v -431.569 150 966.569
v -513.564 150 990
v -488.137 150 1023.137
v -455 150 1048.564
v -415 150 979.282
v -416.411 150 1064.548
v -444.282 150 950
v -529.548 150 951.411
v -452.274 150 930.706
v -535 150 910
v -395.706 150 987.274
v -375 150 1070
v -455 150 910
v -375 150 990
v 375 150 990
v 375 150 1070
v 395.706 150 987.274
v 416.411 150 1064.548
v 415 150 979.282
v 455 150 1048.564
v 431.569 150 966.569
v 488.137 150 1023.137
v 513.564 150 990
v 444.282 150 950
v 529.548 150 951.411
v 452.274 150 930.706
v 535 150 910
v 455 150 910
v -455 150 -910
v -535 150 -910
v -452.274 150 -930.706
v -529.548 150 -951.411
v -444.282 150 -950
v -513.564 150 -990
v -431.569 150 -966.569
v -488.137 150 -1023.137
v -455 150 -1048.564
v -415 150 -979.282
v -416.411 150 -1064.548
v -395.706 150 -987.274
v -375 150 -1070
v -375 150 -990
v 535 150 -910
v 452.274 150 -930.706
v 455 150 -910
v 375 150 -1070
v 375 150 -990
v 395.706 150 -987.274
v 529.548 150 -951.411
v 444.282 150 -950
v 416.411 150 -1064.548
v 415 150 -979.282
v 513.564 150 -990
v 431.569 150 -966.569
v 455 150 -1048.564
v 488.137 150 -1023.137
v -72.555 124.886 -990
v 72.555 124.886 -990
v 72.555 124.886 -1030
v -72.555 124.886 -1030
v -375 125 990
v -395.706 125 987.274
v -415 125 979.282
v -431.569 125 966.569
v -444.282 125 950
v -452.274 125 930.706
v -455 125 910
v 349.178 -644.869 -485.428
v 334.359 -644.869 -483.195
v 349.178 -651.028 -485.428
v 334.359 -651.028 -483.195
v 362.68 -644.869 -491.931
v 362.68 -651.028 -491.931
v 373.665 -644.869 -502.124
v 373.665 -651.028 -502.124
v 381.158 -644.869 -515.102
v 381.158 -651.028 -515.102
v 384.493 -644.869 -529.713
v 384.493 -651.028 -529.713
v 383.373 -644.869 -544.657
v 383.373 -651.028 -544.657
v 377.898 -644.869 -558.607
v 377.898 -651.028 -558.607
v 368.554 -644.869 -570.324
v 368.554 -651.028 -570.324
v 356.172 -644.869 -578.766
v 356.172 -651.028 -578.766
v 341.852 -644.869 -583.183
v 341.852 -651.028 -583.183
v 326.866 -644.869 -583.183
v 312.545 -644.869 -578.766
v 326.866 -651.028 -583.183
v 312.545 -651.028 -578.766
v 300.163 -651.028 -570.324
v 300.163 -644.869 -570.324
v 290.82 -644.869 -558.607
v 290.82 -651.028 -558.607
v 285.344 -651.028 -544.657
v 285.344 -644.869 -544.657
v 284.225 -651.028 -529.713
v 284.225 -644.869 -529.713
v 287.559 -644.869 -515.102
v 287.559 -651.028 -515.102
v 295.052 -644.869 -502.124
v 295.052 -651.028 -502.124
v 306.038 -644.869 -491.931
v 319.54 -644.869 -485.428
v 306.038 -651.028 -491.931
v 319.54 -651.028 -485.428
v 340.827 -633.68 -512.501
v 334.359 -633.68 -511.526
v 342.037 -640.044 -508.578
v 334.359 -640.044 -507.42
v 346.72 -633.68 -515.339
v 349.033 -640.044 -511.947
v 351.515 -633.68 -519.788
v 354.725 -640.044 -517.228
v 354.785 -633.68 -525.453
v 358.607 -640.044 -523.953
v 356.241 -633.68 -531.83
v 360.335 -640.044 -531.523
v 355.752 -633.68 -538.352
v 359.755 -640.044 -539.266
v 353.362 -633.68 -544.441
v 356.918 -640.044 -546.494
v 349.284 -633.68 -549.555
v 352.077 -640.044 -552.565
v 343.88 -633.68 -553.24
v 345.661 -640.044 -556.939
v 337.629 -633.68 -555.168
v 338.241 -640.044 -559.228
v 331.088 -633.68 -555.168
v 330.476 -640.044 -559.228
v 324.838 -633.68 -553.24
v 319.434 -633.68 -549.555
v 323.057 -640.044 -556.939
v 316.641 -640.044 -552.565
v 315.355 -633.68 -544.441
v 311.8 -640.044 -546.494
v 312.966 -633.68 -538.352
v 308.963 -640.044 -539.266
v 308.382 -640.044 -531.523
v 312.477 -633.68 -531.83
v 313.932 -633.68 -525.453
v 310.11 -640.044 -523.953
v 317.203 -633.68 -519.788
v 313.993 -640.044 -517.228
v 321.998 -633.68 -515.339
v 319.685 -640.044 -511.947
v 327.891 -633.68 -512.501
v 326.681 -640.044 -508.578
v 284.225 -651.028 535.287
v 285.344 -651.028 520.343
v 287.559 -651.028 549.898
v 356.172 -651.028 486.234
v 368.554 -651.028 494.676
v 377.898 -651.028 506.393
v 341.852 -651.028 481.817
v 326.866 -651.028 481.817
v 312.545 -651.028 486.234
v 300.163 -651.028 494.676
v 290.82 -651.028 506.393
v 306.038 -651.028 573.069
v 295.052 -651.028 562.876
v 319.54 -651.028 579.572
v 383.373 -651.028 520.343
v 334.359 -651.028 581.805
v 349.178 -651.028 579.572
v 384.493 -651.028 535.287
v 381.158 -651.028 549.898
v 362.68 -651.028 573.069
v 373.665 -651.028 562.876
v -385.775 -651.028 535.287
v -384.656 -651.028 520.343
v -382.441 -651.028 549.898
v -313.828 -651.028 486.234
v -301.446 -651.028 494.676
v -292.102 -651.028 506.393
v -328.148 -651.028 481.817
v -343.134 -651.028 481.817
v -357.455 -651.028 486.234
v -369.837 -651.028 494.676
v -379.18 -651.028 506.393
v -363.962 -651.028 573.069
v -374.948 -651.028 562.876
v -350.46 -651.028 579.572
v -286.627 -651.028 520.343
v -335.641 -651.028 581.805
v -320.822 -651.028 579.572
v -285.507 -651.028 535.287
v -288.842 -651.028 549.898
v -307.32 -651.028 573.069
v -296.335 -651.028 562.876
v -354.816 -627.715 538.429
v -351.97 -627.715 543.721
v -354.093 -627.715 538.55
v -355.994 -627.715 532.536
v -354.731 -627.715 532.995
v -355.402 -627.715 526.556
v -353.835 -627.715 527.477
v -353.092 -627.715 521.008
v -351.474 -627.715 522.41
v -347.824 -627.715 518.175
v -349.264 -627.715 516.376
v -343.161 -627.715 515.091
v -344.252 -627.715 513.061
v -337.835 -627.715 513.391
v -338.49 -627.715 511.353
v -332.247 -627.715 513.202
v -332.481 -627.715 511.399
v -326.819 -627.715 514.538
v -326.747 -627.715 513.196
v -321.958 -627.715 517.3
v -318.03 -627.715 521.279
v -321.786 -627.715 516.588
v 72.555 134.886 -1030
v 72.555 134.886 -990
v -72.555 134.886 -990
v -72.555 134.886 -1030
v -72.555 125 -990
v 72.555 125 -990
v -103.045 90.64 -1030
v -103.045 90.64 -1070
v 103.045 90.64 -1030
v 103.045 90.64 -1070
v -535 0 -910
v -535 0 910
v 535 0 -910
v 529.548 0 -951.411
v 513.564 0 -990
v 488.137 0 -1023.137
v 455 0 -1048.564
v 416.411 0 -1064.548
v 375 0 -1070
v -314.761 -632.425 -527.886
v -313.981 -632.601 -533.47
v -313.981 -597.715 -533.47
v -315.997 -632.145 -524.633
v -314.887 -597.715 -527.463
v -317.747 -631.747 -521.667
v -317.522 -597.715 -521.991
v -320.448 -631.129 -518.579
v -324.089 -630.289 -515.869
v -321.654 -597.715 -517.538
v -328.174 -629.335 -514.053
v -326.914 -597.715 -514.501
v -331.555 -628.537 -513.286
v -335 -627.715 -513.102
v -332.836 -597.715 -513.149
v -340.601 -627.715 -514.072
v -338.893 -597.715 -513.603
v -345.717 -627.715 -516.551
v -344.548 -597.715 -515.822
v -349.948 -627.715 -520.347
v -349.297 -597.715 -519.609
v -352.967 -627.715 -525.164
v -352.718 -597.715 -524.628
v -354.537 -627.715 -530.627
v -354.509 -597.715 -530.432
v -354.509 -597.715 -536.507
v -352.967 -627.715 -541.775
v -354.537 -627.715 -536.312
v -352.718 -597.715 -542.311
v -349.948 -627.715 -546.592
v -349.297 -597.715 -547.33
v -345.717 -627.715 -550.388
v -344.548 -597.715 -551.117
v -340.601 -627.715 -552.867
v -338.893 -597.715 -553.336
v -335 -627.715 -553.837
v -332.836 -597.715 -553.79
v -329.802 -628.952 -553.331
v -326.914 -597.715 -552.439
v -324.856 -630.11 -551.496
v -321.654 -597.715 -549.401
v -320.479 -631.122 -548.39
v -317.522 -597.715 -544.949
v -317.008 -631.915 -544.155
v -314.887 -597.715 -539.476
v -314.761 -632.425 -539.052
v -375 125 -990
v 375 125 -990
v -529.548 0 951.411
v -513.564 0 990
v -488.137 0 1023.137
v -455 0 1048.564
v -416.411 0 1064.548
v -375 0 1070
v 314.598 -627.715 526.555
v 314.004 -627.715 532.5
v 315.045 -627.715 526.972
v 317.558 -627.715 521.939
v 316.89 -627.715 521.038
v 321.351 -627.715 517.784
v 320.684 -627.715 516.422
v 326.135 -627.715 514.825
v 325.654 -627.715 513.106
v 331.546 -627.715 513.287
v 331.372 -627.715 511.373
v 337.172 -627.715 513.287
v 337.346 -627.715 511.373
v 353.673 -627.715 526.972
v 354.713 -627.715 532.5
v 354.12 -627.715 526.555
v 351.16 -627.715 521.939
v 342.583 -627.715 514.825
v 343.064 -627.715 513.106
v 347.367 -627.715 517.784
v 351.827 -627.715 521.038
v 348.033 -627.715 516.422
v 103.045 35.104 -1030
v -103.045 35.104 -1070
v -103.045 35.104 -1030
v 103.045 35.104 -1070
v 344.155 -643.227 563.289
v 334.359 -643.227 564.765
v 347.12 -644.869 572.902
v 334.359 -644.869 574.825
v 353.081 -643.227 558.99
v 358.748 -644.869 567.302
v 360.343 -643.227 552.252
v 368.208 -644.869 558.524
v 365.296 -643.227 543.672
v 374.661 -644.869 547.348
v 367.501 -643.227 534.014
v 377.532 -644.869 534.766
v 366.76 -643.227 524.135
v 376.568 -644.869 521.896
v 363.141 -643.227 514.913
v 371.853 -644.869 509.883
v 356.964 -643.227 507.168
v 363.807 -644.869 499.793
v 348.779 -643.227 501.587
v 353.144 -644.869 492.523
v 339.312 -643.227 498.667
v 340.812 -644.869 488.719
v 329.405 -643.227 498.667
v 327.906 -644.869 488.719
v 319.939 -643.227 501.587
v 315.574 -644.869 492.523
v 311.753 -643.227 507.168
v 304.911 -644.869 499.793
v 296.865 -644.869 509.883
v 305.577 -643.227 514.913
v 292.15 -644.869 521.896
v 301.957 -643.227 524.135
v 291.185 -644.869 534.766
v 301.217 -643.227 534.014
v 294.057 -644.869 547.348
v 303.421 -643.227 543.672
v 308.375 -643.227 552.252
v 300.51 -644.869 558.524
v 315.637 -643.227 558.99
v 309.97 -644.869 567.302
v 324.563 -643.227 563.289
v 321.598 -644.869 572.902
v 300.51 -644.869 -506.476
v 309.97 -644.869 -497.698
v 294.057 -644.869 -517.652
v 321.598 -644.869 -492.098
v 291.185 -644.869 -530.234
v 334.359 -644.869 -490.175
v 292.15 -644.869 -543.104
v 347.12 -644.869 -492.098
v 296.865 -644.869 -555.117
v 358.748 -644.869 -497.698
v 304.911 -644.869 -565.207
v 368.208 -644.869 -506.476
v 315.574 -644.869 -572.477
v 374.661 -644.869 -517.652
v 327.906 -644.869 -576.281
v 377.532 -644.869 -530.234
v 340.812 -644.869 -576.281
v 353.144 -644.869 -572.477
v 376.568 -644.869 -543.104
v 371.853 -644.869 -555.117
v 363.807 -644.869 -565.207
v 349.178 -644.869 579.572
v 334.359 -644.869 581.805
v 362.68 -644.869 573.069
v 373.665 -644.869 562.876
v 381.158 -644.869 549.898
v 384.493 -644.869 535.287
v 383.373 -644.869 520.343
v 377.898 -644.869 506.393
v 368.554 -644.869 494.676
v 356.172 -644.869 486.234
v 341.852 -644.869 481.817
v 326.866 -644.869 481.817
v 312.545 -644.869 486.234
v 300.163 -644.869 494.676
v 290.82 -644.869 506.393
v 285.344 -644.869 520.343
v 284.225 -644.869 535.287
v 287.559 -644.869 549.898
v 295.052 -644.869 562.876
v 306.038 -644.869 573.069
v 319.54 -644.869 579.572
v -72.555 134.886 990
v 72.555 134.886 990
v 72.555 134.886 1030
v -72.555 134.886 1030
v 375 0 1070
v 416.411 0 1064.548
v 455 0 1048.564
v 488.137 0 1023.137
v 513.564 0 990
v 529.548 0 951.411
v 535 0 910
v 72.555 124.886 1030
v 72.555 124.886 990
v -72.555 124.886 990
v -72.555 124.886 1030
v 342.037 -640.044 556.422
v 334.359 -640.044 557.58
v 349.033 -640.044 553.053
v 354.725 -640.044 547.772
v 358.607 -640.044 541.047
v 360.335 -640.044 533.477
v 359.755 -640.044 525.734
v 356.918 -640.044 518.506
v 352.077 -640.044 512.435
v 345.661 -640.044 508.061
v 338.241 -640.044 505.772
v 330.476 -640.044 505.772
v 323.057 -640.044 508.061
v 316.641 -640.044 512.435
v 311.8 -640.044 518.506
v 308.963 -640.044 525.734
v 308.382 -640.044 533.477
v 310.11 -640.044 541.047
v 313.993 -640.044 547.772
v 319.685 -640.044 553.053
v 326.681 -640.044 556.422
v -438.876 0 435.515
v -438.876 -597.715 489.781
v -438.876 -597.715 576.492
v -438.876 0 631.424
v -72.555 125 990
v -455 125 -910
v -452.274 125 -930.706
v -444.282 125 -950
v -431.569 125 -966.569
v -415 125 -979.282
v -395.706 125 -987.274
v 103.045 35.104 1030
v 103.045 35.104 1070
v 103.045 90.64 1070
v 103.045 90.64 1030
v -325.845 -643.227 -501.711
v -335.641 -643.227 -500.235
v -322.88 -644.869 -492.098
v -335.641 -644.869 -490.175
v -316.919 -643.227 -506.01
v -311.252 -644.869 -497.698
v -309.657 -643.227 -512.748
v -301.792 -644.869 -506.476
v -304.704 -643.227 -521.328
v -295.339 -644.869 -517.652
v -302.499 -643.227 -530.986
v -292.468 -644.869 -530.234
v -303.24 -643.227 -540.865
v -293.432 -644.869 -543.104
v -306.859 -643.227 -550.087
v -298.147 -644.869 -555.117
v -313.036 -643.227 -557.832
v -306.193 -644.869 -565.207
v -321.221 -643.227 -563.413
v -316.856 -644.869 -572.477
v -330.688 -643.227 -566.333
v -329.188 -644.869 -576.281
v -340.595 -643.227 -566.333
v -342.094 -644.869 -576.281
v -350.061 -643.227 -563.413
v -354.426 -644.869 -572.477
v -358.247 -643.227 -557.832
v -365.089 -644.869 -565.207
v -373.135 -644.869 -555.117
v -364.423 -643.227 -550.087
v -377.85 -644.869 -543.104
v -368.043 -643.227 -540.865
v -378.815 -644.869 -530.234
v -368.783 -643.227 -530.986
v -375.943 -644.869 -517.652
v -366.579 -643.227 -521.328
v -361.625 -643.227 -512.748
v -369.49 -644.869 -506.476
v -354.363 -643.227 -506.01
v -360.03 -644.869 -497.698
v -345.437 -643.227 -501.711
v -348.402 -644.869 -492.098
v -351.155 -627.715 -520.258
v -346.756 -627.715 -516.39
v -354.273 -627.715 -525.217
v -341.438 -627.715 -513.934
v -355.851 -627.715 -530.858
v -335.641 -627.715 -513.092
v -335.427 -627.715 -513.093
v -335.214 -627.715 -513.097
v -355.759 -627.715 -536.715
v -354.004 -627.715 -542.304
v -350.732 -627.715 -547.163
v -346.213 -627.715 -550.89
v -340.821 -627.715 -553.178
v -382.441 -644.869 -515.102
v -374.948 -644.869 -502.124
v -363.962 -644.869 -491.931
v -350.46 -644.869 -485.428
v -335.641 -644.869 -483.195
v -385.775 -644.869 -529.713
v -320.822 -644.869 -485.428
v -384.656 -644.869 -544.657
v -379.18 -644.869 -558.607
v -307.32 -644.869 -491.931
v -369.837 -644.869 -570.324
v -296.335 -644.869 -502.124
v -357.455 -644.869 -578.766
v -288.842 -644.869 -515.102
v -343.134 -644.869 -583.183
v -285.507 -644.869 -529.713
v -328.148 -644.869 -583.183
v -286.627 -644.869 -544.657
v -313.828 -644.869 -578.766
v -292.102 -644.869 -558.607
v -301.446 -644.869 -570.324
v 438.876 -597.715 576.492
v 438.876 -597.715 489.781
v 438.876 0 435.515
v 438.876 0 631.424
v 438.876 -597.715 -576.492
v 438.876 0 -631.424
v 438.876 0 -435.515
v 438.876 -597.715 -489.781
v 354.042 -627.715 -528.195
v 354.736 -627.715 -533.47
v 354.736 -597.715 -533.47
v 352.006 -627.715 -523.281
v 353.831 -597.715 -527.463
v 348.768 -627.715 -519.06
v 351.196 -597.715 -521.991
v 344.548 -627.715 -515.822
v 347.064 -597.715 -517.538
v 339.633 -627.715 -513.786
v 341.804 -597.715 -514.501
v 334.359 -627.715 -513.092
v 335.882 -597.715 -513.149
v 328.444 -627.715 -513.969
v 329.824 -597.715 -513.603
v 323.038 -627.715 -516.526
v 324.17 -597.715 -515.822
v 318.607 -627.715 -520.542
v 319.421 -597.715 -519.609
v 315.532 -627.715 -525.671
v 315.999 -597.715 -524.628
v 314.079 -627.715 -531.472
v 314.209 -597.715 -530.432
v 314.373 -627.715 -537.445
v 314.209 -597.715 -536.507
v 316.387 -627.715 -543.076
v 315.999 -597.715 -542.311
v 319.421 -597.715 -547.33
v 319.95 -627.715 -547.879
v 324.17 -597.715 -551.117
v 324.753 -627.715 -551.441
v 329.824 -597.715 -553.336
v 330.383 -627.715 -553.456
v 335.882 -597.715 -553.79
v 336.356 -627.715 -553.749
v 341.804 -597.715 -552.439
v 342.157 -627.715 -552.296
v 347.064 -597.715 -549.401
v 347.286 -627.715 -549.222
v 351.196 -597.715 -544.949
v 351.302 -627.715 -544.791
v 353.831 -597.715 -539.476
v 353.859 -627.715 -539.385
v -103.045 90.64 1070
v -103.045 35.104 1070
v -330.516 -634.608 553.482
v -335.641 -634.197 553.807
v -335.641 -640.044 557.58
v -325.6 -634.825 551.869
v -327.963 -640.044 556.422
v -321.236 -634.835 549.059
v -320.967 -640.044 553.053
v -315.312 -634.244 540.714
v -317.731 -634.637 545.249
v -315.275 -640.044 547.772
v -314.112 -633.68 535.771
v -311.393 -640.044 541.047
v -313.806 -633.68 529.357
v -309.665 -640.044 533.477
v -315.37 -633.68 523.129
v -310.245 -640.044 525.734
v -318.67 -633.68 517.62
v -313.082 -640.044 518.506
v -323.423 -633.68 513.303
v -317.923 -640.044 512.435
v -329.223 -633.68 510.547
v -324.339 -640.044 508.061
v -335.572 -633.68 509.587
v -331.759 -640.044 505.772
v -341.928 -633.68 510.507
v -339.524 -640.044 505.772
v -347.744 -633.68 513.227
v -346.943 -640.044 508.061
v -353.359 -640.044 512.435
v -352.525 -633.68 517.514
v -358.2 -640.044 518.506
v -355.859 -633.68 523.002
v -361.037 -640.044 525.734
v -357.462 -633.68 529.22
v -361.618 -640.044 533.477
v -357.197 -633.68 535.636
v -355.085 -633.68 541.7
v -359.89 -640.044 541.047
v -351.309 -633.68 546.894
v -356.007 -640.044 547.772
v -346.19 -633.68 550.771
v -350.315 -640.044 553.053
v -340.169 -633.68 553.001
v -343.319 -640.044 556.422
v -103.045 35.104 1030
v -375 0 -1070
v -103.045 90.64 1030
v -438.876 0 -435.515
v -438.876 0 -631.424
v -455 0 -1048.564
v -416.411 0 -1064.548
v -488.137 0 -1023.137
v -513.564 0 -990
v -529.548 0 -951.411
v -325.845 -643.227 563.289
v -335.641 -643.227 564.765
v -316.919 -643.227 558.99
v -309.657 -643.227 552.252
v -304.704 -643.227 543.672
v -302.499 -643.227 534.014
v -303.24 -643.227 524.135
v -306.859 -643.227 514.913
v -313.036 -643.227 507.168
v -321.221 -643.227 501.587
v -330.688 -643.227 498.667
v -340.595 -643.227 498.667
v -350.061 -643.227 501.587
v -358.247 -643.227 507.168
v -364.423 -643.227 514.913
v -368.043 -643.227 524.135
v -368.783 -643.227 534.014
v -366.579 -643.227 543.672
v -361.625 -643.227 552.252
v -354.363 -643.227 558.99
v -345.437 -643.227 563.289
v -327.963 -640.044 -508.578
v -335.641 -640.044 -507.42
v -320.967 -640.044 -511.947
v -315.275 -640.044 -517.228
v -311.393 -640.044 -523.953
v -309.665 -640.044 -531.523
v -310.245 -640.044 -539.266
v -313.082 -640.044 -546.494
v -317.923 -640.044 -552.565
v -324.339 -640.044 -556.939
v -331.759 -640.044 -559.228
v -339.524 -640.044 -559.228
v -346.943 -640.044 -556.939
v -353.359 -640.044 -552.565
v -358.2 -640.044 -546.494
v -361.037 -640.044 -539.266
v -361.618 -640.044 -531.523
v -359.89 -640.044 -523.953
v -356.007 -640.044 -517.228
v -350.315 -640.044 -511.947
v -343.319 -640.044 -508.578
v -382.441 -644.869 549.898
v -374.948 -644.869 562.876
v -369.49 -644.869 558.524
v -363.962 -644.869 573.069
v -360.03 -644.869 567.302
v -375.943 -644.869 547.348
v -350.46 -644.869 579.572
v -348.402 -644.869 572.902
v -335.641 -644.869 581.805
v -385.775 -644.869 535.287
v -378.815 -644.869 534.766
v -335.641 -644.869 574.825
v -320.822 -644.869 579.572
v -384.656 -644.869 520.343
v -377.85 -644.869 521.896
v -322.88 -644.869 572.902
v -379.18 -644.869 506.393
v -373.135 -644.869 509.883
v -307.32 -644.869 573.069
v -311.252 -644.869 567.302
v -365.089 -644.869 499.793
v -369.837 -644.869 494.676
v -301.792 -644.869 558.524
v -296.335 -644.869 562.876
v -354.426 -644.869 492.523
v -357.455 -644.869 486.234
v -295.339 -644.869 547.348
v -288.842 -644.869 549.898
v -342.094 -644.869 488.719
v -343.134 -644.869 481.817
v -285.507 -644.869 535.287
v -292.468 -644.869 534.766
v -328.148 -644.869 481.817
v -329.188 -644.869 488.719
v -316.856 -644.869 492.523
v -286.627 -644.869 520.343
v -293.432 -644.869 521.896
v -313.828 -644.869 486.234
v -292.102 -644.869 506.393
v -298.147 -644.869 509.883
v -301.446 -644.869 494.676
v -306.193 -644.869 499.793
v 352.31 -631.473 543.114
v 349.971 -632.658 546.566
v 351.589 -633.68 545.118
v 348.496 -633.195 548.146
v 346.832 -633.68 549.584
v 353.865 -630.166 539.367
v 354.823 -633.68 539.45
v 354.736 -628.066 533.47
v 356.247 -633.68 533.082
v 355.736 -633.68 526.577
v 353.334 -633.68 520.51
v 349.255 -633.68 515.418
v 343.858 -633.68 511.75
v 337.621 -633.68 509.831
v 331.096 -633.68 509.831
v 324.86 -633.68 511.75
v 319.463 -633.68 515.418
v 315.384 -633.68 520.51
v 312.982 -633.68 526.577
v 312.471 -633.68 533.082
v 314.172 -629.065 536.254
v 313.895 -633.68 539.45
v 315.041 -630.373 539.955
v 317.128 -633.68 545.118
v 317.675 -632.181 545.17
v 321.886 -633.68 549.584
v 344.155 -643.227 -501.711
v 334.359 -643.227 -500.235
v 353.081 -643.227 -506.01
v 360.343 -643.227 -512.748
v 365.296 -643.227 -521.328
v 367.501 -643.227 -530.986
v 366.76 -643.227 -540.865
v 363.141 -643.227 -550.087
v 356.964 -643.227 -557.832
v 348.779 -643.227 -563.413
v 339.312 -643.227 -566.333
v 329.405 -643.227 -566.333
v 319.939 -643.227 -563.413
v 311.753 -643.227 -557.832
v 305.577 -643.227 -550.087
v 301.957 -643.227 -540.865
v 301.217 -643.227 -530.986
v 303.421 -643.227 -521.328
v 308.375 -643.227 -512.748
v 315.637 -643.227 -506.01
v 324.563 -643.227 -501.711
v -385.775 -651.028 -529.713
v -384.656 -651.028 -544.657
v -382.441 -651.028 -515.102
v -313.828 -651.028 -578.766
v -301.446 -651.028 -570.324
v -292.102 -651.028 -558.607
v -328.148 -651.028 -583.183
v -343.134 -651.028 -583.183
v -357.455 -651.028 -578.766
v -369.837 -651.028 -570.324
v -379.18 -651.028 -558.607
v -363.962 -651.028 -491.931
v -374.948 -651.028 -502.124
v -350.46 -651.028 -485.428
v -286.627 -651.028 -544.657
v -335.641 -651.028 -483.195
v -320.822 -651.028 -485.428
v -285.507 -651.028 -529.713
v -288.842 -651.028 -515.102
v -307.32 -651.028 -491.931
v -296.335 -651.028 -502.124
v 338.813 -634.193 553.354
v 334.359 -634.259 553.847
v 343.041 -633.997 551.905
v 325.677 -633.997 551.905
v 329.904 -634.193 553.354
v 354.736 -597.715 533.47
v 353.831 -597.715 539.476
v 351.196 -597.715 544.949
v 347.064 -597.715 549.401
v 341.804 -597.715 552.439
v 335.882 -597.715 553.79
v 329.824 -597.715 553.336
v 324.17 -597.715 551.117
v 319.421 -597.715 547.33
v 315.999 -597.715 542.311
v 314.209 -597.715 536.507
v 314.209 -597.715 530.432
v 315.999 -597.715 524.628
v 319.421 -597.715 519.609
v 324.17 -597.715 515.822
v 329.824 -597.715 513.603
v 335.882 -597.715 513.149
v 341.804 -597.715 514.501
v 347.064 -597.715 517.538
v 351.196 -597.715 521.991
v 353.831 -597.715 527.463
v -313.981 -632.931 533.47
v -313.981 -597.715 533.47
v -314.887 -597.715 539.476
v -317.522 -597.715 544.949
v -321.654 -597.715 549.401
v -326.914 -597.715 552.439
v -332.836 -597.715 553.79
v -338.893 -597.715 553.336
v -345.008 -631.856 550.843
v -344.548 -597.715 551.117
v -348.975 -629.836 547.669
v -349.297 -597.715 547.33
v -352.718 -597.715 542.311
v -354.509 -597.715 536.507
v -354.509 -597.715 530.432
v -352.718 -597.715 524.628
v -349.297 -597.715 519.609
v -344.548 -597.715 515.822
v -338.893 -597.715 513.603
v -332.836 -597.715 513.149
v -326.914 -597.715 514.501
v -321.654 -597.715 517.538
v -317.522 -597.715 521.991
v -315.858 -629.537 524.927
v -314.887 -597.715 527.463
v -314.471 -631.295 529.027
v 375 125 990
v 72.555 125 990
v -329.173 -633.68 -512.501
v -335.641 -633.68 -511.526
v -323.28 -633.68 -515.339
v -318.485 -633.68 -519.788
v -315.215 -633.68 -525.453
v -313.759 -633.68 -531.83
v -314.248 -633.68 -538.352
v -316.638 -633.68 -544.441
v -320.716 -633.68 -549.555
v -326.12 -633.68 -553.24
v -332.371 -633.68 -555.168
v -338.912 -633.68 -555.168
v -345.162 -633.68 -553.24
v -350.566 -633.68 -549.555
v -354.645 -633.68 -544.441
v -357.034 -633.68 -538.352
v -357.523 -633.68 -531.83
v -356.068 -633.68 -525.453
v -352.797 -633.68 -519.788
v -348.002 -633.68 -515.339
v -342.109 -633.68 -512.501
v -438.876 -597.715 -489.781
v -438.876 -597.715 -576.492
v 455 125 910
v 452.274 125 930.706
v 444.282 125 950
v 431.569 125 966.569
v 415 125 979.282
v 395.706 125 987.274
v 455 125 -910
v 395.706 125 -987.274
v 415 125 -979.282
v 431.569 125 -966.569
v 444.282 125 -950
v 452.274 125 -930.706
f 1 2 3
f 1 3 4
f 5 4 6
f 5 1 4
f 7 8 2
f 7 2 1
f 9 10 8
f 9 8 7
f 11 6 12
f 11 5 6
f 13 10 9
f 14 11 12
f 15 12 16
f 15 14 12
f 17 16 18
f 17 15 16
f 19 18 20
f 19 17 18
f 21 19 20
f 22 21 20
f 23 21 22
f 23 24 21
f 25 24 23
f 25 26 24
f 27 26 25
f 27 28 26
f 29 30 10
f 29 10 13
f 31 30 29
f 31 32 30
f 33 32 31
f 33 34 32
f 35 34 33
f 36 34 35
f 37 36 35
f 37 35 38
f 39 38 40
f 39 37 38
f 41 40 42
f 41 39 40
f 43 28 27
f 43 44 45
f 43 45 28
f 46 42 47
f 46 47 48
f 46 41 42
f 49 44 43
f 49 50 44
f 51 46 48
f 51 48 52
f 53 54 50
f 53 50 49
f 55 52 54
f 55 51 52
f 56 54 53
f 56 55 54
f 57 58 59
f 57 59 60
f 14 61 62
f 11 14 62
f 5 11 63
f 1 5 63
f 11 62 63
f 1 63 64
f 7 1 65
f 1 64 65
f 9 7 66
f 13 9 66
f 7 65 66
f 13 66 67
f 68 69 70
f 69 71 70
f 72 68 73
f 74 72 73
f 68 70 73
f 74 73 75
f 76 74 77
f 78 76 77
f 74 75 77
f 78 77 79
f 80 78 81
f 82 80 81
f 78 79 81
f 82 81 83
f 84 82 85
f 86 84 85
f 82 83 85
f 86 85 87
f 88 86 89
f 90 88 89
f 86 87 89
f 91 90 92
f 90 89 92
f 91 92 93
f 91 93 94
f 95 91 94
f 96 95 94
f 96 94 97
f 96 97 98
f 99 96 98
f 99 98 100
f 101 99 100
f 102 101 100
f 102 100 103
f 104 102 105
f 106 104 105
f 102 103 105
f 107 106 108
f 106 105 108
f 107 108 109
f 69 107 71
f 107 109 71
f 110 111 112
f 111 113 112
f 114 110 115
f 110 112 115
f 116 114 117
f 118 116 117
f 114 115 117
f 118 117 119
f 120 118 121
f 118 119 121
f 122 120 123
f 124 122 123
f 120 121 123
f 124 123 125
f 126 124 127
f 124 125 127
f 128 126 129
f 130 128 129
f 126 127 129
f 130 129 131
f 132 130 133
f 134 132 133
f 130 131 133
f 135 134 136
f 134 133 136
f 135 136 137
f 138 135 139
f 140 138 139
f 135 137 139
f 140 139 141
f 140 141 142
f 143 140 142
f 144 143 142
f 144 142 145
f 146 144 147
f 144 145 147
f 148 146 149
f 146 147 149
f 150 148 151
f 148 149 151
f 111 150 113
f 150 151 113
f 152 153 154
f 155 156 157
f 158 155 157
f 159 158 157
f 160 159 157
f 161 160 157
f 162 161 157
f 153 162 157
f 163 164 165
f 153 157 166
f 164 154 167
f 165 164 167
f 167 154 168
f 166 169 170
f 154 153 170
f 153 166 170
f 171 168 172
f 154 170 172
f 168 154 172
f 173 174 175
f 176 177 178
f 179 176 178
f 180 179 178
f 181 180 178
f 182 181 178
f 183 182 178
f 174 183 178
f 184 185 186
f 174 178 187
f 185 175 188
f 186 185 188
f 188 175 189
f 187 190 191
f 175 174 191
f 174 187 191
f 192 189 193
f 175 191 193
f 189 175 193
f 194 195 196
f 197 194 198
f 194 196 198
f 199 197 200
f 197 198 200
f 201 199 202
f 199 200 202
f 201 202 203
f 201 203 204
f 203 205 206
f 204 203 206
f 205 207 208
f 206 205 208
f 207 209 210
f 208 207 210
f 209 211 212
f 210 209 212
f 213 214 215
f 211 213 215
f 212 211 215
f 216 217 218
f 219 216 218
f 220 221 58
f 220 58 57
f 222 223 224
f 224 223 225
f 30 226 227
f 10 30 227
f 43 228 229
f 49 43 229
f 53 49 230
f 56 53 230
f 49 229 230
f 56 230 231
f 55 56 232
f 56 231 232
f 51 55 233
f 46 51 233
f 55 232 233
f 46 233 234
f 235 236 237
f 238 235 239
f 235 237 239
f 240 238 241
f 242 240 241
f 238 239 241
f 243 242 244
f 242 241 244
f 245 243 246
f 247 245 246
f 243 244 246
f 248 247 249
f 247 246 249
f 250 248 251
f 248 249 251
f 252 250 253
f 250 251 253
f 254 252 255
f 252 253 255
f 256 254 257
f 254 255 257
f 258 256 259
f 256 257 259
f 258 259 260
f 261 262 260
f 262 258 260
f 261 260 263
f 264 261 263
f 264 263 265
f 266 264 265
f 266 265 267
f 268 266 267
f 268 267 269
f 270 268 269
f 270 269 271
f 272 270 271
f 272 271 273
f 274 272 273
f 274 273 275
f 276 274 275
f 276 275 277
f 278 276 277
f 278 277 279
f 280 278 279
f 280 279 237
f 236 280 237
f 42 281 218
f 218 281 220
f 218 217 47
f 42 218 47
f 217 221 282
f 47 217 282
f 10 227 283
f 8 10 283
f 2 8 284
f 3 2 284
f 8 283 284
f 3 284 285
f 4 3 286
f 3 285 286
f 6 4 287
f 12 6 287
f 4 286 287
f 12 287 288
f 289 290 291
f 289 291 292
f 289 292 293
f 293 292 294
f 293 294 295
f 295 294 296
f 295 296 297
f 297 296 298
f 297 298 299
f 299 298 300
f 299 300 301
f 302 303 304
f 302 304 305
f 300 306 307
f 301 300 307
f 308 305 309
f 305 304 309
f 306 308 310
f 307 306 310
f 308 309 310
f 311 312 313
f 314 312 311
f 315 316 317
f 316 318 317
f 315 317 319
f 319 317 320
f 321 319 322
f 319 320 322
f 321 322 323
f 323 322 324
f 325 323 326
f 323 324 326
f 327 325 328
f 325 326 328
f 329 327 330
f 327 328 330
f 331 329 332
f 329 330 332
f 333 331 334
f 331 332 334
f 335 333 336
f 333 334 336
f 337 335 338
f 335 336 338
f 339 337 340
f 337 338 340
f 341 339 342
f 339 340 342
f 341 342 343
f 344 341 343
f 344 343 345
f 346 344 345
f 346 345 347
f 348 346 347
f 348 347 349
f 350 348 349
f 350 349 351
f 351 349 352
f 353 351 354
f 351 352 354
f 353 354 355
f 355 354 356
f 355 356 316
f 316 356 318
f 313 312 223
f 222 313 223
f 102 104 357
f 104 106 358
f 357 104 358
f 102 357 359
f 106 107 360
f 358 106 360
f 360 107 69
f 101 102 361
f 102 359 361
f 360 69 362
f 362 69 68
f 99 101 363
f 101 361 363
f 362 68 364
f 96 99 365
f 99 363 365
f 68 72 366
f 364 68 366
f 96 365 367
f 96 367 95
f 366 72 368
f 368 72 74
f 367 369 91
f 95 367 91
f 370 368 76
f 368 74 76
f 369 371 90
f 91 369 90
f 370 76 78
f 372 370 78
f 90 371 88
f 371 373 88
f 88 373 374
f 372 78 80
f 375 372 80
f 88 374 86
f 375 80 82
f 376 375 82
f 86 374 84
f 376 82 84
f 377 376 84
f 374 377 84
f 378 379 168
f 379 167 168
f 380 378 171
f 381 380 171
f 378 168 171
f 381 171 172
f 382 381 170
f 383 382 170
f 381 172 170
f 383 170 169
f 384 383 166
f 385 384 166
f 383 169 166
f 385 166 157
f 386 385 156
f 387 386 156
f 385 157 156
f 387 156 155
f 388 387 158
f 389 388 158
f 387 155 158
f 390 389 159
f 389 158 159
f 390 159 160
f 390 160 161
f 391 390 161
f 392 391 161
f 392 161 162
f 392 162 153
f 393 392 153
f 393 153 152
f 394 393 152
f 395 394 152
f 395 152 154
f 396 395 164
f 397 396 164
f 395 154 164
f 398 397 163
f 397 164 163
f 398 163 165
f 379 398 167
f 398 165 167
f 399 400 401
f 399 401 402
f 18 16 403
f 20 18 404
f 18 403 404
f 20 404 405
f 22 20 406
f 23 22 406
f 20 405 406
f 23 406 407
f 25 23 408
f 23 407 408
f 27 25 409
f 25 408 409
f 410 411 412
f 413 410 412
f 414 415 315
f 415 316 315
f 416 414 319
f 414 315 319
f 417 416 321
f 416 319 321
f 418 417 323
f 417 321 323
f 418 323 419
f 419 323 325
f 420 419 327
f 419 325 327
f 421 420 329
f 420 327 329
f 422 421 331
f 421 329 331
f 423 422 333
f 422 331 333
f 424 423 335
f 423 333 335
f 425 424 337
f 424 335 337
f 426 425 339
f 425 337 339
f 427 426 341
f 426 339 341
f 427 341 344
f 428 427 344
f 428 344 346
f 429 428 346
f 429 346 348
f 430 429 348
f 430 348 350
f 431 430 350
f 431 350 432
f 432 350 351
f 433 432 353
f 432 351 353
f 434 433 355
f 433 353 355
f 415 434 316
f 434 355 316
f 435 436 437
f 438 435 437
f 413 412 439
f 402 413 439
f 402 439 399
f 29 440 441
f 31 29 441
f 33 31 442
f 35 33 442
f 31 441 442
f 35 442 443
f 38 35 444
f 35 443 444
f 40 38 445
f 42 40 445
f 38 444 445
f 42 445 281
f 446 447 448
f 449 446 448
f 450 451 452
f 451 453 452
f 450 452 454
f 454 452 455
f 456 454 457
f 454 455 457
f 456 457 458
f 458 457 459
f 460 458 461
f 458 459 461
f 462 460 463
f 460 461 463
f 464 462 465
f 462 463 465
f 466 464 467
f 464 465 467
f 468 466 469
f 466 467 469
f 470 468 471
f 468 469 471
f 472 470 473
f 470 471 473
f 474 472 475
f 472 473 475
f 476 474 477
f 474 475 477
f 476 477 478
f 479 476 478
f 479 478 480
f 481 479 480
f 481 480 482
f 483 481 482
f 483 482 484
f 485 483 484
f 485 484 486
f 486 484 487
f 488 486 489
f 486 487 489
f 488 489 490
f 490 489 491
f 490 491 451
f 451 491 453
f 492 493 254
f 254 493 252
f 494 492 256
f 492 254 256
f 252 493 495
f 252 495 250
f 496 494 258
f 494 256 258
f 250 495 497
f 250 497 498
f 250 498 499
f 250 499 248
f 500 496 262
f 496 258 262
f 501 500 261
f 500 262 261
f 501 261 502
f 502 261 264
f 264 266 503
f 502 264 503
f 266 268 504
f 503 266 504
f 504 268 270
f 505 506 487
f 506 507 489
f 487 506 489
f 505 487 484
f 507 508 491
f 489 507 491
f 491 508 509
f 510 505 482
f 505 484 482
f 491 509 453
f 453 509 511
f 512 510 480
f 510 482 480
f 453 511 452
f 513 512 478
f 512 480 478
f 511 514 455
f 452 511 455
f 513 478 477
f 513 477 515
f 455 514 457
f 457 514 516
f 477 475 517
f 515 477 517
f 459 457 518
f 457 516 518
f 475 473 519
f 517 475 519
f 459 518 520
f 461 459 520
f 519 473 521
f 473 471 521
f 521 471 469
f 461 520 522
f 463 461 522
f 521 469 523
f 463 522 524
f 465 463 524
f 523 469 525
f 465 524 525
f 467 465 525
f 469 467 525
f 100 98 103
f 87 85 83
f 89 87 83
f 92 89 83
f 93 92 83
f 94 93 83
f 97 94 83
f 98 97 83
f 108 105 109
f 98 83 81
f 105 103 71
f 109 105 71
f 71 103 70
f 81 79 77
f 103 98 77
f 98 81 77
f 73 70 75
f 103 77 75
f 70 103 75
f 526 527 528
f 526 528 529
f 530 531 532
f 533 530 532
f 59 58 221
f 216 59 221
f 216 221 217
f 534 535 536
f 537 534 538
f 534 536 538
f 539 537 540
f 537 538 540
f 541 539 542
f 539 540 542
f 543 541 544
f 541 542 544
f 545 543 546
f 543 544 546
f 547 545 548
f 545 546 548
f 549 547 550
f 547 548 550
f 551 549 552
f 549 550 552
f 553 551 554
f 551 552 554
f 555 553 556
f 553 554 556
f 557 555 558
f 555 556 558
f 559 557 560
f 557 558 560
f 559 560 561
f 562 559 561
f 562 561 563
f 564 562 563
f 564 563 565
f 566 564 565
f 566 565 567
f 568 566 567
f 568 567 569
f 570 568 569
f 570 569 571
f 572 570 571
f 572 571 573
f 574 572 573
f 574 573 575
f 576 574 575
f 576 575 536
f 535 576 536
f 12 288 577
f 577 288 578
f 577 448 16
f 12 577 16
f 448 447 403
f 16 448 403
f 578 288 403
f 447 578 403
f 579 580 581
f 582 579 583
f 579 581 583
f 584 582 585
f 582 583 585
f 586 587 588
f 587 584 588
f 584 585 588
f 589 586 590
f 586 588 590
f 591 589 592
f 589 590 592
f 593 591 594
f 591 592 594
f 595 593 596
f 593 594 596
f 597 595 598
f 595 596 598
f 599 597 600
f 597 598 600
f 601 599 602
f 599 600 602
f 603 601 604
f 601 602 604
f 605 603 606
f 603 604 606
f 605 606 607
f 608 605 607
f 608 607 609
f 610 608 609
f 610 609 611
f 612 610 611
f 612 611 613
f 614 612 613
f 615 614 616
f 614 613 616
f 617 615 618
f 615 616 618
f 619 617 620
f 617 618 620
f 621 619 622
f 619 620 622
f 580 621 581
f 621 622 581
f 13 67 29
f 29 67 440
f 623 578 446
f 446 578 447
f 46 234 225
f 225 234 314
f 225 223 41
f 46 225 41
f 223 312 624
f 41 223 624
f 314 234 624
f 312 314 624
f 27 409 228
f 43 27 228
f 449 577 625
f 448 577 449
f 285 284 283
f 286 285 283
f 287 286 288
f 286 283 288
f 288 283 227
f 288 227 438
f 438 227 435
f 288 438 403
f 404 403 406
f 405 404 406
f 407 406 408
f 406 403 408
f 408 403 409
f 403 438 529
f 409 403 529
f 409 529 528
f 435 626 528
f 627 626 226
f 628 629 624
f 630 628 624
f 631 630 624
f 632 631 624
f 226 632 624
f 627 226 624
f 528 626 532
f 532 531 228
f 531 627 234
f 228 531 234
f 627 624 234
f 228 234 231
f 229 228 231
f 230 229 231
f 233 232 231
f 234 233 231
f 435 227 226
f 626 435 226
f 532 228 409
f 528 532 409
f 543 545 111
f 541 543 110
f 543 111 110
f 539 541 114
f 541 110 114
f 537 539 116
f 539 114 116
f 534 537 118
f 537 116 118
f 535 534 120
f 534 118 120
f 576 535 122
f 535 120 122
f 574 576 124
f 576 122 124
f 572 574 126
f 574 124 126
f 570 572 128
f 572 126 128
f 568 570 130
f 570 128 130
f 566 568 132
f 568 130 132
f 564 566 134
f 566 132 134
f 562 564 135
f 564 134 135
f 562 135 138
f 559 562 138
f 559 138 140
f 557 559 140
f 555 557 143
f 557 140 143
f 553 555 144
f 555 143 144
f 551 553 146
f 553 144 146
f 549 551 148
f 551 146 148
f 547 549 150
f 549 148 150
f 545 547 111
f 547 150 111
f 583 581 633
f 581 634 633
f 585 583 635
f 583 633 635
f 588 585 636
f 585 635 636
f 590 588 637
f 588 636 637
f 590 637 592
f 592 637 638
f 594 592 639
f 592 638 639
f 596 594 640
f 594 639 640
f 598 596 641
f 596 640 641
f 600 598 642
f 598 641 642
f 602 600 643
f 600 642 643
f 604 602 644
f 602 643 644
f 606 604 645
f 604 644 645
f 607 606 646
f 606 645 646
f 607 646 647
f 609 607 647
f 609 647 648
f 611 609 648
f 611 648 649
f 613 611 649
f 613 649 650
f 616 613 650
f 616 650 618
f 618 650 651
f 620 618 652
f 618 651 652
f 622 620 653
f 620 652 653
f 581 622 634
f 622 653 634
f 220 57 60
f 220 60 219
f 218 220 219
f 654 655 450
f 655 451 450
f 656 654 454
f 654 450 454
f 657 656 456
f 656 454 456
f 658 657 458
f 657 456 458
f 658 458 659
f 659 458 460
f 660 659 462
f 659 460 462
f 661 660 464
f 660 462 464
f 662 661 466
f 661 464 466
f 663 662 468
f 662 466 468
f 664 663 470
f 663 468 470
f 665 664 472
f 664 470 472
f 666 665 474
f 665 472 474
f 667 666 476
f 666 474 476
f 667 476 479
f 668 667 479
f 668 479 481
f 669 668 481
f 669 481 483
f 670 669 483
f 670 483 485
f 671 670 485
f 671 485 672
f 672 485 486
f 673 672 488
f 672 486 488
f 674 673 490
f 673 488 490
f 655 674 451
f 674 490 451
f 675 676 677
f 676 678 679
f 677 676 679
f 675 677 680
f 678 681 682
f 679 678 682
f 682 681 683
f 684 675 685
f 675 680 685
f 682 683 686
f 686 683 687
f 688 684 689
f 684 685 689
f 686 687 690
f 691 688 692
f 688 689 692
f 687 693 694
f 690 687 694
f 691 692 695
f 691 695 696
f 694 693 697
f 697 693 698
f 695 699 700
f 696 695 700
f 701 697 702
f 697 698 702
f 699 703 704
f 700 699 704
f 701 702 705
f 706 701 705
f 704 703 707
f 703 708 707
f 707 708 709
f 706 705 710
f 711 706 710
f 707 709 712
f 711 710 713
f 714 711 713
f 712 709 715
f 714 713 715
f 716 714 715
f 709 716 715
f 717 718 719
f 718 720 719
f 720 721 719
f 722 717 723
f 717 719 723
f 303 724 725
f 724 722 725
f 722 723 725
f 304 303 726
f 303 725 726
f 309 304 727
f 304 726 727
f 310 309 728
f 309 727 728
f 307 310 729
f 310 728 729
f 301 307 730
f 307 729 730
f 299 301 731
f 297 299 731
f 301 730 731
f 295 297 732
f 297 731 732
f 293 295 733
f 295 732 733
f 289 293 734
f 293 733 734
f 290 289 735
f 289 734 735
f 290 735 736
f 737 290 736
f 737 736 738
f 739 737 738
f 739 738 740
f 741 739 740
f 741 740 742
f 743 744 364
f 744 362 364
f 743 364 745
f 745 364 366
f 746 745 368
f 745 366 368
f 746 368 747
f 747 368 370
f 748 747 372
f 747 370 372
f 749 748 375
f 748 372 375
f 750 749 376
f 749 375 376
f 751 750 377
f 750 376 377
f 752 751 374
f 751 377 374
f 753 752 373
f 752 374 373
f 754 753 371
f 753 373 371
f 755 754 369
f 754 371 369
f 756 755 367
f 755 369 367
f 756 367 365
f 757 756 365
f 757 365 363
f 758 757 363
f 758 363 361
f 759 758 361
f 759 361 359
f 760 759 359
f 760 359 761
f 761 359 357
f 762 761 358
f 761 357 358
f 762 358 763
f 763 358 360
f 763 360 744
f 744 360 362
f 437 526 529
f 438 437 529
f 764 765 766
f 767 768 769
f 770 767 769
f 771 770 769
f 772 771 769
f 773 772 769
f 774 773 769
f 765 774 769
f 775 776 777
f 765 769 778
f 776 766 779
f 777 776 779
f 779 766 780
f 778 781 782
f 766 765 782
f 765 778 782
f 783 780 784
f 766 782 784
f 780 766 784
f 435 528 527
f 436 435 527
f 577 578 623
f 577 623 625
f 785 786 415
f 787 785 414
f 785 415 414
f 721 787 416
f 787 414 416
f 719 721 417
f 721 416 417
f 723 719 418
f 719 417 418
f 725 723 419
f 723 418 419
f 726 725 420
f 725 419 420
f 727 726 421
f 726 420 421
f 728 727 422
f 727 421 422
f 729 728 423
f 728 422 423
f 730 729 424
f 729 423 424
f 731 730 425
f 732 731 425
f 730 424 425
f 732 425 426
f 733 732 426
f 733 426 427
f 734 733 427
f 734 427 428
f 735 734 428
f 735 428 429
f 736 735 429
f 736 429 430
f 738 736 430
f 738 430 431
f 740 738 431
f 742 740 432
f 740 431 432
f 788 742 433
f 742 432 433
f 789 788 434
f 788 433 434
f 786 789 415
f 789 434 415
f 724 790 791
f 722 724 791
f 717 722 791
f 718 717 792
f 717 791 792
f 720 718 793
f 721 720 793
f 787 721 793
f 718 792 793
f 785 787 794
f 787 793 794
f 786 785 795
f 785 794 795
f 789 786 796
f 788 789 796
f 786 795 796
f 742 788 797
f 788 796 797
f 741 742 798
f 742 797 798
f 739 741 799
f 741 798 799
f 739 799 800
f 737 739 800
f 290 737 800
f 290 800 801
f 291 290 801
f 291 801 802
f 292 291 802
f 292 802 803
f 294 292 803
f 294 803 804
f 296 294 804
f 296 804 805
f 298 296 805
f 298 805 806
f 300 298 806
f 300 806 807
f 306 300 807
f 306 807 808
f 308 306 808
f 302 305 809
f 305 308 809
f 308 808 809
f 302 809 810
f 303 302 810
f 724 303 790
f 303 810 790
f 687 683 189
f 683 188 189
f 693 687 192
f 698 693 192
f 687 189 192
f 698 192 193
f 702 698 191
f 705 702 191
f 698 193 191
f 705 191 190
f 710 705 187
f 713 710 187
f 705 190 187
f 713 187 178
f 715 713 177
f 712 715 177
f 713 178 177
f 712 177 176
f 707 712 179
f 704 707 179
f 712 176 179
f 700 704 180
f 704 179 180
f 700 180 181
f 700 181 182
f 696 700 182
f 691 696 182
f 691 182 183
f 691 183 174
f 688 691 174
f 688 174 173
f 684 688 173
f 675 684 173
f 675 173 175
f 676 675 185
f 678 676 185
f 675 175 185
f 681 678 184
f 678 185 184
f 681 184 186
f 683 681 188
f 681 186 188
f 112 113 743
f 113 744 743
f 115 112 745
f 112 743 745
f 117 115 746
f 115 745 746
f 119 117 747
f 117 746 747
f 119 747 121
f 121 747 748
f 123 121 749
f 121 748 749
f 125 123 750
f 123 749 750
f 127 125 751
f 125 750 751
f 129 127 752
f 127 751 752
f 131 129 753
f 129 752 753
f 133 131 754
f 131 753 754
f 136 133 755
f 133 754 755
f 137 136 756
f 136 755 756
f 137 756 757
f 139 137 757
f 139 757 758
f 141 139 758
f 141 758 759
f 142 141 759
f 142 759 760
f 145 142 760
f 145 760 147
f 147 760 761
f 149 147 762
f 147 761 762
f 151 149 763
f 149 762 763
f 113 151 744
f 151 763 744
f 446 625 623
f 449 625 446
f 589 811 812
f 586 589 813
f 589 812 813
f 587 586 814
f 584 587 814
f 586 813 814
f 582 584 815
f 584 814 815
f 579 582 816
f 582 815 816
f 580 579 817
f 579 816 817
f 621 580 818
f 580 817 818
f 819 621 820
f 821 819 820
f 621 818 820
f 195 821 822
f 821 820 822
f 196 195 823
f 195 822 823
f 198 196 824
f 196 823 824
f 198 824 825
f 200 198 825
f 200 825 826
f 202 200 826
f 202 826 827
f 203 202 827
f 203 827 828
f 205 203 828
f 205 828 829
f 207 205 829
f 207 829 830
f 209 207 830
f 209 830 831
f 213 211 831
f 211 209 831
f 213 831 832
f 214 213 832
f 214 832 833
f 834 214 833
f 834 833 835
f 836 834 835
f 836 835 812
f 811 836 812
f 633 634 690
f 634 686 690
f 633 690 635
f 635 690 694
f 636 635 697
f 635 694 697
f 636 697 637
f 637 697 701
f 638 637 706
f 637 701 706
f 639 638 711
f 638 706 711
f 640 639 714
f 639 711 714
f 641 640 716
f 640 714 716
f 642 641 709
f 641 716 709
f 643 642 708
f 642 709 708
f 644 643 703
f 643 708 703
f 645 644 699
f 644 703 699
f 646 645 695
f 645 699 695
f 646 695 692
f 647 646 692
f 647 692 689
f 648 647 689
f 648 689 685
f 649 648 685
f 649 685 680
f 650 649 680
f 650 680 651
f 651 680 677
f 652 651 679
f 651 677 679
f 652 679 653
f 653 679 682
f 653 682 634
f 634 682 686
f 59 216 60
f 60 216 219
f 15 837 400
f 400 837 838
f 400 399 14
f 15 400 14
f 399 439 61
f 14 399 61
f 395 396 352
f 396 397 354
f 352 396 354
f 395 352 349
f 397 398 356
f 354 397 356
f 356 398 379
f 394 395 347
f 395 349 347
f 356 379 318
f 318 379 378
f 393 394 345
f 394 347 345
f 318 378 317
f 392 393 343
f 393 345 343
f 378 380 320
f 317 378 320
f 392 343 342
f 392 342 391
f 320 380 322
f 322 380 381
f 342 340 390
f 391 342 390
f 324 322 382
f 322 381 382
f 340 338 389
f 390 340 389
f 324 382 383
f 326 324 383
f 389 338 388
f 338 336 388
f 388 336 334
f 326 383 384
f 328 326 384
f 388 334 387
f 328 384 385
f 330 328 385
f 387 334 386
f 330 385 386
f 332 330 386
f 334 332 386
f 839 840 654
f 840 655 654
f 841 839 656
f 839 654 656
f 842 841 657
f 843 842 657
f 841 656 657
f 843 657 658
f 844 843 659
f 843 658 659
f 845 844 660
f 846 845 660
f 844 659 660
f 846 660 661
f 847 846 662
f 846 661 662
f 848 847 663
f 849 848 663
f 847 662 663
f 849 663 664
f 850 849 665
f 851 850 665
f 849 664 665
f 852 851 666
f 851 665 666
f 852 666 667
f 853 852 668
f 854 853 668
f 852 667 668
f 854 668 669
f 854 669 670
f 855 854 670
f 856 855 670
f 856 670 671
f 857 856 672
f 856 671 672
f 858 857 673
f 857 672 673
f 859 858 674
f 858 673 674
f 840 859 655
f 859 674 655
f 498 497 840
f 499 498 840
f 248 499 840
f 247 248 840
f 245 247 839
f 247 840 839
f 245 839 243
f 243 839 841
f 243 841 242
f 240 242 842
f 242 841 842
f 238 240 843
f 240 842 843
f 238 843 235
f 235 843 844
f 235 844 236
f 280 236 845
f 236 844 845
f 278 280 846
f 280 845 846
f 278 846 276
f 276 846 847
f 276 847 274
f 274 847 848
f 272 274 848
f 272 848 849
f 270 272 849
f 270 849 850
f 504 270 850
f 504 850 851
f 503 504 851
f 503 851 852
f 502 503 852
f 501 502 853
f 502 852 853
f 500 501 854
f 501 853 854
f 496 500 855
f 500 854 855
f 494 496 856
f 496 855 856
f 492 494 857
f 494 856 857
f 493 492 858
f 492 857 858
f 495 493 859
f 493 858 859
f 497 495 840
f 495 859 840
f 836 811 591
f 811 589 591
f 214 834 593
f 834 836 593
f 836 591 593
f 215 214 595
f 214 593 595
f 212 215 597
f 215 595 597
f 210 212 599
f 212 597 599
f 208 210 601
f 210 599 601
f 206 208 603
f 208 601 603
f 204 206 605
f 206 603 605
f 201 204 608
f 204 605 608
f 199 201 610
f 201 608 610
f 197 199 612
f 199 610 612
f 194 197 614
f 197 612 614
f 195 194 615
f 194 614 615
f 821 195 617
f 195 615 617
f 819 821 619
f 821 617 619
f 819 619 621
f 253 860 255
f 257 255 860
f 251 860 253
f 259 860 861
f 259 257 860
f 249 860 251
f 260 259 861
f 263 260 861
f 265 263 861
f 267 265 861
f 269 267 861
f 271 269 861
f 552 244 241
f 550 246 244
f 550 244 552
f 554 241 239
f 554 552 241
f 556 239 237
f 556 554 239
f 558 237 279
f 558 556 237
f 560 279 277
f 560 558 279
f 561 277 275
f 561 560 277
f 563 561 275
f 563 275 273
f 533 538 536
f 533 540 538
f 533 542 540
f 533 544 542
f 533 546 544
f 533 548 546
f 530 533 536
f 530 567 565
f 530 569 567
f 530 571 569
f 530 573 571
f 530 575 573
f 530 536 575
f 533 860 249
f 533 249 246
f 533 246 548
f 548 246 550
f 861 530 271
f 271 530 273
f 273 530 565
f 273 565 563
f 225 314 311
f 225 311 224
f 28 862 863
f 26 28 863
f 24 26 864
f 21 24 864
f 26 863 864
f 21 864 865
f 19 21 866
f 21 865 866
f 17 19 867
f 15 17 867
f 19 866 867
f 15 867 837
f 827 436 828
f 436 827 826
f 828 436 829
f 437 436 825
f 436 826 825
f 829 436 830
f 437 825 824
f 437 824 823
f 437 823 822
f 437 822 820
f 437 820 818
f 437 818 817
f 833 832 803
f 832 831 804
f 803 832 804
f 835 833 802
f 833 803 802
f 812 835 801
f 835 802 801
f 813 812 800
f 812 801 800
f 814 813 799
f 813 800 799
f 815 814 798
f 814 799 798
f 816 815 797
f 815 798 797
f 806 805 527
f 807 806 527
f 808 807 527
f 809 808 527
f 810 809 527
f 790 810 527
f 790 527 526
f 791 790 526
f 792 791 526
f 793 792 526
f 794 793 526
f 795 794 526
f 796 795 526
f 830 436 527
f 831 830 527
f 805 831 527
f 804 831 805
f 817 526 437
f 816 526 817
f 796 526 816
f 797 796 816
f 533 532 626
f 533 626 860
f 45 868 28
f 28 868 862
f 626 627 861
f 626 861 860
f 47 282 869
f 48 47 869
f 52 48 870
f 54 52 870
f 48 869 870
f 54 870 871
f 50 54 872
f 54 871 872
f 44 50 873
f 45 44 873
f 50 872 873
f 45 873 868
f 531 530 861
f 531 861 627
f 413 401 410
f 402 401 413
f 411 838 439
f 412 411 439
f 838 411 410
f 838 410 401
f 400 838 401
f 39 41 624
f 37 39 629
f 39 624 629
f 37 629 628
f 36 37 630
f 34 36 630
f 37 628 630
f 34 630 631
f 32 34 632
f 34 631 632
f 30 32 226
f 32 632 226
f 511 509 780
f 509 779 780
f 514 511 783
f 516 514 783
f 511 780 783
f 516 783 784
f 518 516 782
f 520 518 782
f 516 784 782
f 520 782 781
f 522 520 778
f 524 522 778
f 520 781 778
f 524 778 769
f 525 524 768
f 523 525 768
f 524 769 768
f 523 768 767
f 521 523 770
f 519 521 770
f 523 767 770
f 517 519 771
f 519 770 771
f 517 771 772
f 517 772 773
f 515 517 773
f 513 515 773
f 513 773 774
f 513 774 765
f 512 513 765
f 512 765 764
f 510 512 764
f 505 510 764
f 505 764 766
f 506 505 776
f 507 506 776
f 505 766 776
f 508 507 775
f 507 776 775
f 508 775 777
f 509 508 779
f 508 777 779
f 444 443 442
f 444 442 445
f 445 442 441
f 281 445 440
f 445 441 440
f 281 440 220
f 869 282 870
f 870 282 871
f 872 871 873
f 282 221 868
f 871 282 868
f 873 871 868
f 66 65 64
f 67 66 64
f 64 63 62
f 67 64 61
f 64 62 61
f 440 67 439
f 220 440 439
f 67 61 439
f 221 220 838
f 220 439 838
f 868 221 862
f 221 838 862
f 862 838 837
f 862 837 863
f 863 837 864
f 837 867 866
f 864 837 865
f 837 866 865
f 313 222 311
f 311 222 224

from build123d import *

# Parameters (mm, degrees)
BOSS_EXTRUDE1_DEPTH  = 150
SKETCH3_W            = 943.281144354
SKETCH3_H            = 2008.356165054
BOSS_EXTRUDE2_DEPTH  = 125
SKETCH4_W            = 877.751971552
SKETCH4_H            = 195.909630412
BOSS_EXTRUDE3_DEPTH  = 670
CUT_EXTRUDE1_DEPTH   = 1095
SKETCH6_R            = 20.377587803
BOSS_EXTRUDE4_DEPTH  = 40
SKETCH7_W            = 40.755175605
SKETCH7_H            = 40.755175605
CUT_EXTRUDE2_DEPTH   = 10
LPATTERN1_COUNT      = 2
LPATTERN1_PITCH      = 670
LPATTERN1_COUNT_DIR2 = 2
LPATTERN1_PITCH_DIR2 = 1065
SKETCH9_W            = 206.090065038
SKETCH9_H            = 55.535964875
CUT_EXTRUDE3_DEPTH   = 40
SKETCH10_W           = 145.11063413
SKETCH10_H           = 10
CUT_EXTRUDE4_DEPTH   = 40


with BuildPart() as part:
    # Sketch1 → Boss-Extrude1 (new body)
    with BuildSketch(Plane(origin=(0, 0, 0), x_dir=(1, 0, 0), z_dir=(0, 1, 0))):
        with BuildLine():
            Line((-535, 910), (-535, -910))
            ThreePointArc((-535, -910), (-488.13708499, -1023.13708499), (-375, -1070))
            Line((-375, -1070), (375, -1070))
            ThreePointArc((375, -1070), (488.13708499, -1023.13708499), (535, -910))
            Line((535, -910), (535, 910))
            ThreePointArc((535, 910), (488.13708499, 1023.13708499), (375, 1070))
            Line((375, 1070), (-375, 1070))
            ThreePointArc((-375, 1070), (-488.13708499, 1023.13708499), (-535, 910))
        make_face()
        with BuildLine():
            Line((-375, 990), (375, 990))
            ThreePointArc((375, 990), (431.568542495, 966.568542495), (455, 910))
            Line((455, 910), (455, -910))
            ThreePointArc((455, -910), (431.568542495, -966.568542495), (375, -990))
            Line((375, -990), (-375, -990))
            ThreePointArc((-375, -990), (-431.568542495, -966.568542495), (-455, -910))
            Line((-455, -910), (-455, 910))
            ThreePointArc((-455, 910), (-431.568542495, 966.568542495), (-375, 990))
        make_face(mode=Mode.SUBTRACT)
    extrude(amount=BOSS_EXTRUDE1_DEPTH)

    # Sketch3 → Boss-Extrude2 (add)
    with BuildSketch(Plane.XZ):
        Rectangle(SKETCH3_W, SKETCH3_H)
    extrude(amount=-BOSS_EXTRUDE2_DEPTH)

    # Sketch4 → Boss-Extrude3 (add)
    with BuildSketch(Plane.XZ):
        with Locations((0, 533.469606343)):
            Rectangle(SKETCH4_W, SKETCH4_H)
        with Locations((0, -533.469606343)):
            Rectangle(SKETCH4_W, SKETCH4_H)
    extrude(amount=BOSS_EXTRUDE3_DEPTH)

    # Sketch5 → Cut-Extrude1 (cut)
    with BuildSketch(Plane(origin=(438.875985776, 0, 0), x_dir=(0, 0, -1), z_dir=(1, 0, 0))):
        Polygon((-576.492082972, -597.71526573), (-631.424421549, 0), (-813.99135503, -798.682277913), (-322.424833628, -798.682277913), (-435.514791137, 0), (-489.780888803, -597.71526573), align=None)
        Polygon((435.514791137, 0), (489.780888803, -597.71526573), (576.492082972, -597.71526573), (631.424421549, 0), (813.99135503, -798.682277913), (322.424833628, -798.682277913), align=None)
    extrude(amount=-CUT_EXTRUDE1_DEPTH, mode=Mode.SUBTRACT)

    # Sketch6 → Boss-Extrude4 (add)
    with BuildSketch(Plane.XZ.offset(597.71526573)):
        with Locations((334.358840028, -533.469606343)):
            Circle(SKETCH6_R)
        with Locations((-334.358840028, -533.469606343)):
            Circle(SKETCH6_R)
        with Locations((-334.358840028, 533.469606343)):
            Circle(SKETCH6_R)
        with Locations((334.358840028, 533.469606343)):
            Circle(SKETCH6_R)
    extrude(amount=BOSS_EXTRUDE4_DEPTH)

    # Sketch7 → Cut-Extrude2 (cut)
    with BuildSketch(Plane.XZ.offset(637.71526573)):
        with Locations((354.736427831, -533.469606343)):
            Rectangle(SKETCH7_W, SKETCH7_H)
    extrude(amount=-CUT_EXTRUDE2_DEPTH, mode=Mode.SUBTRACT)

    # Sketch8 → Revolve1 (revolve)
    with BuildSketch(Plane(origin=(334.358840028, 0, 0), x_dir=(0, 0, -1), z_dir=(1, 0, 0))):
        Polygon((513.09201854, -627.71526573), (511.526412773, -633.680135283), (507.420377104, -640.04449057), (500.234814684, -643.226668213), (490.175027295, -644.86908248), (483.194766658, -644.86908248), (483.194766658, -651.028135984), (533.469606343, -651.028135984), (533.469606343, -627.71526573), align=None)
    revolve1 = revolve(axis=Axis((334.358840028, -651.028135984, -533.469606343), (0, 1, 0)))

    # LPattern1: Revolve1 2 × 2
    with Locations(*[(-i * LPATTERN1_PITCH, 0, j * LPATTERN1_PITCH_DIR2) for i in range(LPATTERN1_COUNT) for j in range(LPATTERN1_COUNT_DIR2) if (i, j) != (0, 0)]):
        add(revolve1)

    # Sketch9 → Cut-Extrude3 (cut)
    with BuildSketch(Plane.XY.offset(1070)):
        with Locations((0, 62.871676898)):
            Rectangle(SKETCH9_W, SKETCH9_H)
    cut_extrude3 = extrude(amount=-CUT_EXTRUDE3_DEPTH, mode=Mode.SUBTRACT)

    # Sketch10 → Cut-Extrude4 (cut)
    with BuildSketch(Plane(origin=(0, 0, 990), x_dir=(-1, 0, 0), z_dir=(0, 0, -1))):
        with Locations((0, 129.886472927)):
            Rectangle(SKETCH10_W, SKETCH10_H)
    cut_extrude4 = extrude(amount=-CUT_EXTRUDE4_DEPTH, mode=Mode.SUBTRACT)

    # Mirror1: Cut-Extrude3, Cut-Extrude4 across plane
    add(cut_extrude3.mirror(Plane.XY), mode=Mode.SUBTRACT)
    add(cut_extrude4.mirror(Plane.XY), mode=Mode.SUBTRACT)


solid = part.part
